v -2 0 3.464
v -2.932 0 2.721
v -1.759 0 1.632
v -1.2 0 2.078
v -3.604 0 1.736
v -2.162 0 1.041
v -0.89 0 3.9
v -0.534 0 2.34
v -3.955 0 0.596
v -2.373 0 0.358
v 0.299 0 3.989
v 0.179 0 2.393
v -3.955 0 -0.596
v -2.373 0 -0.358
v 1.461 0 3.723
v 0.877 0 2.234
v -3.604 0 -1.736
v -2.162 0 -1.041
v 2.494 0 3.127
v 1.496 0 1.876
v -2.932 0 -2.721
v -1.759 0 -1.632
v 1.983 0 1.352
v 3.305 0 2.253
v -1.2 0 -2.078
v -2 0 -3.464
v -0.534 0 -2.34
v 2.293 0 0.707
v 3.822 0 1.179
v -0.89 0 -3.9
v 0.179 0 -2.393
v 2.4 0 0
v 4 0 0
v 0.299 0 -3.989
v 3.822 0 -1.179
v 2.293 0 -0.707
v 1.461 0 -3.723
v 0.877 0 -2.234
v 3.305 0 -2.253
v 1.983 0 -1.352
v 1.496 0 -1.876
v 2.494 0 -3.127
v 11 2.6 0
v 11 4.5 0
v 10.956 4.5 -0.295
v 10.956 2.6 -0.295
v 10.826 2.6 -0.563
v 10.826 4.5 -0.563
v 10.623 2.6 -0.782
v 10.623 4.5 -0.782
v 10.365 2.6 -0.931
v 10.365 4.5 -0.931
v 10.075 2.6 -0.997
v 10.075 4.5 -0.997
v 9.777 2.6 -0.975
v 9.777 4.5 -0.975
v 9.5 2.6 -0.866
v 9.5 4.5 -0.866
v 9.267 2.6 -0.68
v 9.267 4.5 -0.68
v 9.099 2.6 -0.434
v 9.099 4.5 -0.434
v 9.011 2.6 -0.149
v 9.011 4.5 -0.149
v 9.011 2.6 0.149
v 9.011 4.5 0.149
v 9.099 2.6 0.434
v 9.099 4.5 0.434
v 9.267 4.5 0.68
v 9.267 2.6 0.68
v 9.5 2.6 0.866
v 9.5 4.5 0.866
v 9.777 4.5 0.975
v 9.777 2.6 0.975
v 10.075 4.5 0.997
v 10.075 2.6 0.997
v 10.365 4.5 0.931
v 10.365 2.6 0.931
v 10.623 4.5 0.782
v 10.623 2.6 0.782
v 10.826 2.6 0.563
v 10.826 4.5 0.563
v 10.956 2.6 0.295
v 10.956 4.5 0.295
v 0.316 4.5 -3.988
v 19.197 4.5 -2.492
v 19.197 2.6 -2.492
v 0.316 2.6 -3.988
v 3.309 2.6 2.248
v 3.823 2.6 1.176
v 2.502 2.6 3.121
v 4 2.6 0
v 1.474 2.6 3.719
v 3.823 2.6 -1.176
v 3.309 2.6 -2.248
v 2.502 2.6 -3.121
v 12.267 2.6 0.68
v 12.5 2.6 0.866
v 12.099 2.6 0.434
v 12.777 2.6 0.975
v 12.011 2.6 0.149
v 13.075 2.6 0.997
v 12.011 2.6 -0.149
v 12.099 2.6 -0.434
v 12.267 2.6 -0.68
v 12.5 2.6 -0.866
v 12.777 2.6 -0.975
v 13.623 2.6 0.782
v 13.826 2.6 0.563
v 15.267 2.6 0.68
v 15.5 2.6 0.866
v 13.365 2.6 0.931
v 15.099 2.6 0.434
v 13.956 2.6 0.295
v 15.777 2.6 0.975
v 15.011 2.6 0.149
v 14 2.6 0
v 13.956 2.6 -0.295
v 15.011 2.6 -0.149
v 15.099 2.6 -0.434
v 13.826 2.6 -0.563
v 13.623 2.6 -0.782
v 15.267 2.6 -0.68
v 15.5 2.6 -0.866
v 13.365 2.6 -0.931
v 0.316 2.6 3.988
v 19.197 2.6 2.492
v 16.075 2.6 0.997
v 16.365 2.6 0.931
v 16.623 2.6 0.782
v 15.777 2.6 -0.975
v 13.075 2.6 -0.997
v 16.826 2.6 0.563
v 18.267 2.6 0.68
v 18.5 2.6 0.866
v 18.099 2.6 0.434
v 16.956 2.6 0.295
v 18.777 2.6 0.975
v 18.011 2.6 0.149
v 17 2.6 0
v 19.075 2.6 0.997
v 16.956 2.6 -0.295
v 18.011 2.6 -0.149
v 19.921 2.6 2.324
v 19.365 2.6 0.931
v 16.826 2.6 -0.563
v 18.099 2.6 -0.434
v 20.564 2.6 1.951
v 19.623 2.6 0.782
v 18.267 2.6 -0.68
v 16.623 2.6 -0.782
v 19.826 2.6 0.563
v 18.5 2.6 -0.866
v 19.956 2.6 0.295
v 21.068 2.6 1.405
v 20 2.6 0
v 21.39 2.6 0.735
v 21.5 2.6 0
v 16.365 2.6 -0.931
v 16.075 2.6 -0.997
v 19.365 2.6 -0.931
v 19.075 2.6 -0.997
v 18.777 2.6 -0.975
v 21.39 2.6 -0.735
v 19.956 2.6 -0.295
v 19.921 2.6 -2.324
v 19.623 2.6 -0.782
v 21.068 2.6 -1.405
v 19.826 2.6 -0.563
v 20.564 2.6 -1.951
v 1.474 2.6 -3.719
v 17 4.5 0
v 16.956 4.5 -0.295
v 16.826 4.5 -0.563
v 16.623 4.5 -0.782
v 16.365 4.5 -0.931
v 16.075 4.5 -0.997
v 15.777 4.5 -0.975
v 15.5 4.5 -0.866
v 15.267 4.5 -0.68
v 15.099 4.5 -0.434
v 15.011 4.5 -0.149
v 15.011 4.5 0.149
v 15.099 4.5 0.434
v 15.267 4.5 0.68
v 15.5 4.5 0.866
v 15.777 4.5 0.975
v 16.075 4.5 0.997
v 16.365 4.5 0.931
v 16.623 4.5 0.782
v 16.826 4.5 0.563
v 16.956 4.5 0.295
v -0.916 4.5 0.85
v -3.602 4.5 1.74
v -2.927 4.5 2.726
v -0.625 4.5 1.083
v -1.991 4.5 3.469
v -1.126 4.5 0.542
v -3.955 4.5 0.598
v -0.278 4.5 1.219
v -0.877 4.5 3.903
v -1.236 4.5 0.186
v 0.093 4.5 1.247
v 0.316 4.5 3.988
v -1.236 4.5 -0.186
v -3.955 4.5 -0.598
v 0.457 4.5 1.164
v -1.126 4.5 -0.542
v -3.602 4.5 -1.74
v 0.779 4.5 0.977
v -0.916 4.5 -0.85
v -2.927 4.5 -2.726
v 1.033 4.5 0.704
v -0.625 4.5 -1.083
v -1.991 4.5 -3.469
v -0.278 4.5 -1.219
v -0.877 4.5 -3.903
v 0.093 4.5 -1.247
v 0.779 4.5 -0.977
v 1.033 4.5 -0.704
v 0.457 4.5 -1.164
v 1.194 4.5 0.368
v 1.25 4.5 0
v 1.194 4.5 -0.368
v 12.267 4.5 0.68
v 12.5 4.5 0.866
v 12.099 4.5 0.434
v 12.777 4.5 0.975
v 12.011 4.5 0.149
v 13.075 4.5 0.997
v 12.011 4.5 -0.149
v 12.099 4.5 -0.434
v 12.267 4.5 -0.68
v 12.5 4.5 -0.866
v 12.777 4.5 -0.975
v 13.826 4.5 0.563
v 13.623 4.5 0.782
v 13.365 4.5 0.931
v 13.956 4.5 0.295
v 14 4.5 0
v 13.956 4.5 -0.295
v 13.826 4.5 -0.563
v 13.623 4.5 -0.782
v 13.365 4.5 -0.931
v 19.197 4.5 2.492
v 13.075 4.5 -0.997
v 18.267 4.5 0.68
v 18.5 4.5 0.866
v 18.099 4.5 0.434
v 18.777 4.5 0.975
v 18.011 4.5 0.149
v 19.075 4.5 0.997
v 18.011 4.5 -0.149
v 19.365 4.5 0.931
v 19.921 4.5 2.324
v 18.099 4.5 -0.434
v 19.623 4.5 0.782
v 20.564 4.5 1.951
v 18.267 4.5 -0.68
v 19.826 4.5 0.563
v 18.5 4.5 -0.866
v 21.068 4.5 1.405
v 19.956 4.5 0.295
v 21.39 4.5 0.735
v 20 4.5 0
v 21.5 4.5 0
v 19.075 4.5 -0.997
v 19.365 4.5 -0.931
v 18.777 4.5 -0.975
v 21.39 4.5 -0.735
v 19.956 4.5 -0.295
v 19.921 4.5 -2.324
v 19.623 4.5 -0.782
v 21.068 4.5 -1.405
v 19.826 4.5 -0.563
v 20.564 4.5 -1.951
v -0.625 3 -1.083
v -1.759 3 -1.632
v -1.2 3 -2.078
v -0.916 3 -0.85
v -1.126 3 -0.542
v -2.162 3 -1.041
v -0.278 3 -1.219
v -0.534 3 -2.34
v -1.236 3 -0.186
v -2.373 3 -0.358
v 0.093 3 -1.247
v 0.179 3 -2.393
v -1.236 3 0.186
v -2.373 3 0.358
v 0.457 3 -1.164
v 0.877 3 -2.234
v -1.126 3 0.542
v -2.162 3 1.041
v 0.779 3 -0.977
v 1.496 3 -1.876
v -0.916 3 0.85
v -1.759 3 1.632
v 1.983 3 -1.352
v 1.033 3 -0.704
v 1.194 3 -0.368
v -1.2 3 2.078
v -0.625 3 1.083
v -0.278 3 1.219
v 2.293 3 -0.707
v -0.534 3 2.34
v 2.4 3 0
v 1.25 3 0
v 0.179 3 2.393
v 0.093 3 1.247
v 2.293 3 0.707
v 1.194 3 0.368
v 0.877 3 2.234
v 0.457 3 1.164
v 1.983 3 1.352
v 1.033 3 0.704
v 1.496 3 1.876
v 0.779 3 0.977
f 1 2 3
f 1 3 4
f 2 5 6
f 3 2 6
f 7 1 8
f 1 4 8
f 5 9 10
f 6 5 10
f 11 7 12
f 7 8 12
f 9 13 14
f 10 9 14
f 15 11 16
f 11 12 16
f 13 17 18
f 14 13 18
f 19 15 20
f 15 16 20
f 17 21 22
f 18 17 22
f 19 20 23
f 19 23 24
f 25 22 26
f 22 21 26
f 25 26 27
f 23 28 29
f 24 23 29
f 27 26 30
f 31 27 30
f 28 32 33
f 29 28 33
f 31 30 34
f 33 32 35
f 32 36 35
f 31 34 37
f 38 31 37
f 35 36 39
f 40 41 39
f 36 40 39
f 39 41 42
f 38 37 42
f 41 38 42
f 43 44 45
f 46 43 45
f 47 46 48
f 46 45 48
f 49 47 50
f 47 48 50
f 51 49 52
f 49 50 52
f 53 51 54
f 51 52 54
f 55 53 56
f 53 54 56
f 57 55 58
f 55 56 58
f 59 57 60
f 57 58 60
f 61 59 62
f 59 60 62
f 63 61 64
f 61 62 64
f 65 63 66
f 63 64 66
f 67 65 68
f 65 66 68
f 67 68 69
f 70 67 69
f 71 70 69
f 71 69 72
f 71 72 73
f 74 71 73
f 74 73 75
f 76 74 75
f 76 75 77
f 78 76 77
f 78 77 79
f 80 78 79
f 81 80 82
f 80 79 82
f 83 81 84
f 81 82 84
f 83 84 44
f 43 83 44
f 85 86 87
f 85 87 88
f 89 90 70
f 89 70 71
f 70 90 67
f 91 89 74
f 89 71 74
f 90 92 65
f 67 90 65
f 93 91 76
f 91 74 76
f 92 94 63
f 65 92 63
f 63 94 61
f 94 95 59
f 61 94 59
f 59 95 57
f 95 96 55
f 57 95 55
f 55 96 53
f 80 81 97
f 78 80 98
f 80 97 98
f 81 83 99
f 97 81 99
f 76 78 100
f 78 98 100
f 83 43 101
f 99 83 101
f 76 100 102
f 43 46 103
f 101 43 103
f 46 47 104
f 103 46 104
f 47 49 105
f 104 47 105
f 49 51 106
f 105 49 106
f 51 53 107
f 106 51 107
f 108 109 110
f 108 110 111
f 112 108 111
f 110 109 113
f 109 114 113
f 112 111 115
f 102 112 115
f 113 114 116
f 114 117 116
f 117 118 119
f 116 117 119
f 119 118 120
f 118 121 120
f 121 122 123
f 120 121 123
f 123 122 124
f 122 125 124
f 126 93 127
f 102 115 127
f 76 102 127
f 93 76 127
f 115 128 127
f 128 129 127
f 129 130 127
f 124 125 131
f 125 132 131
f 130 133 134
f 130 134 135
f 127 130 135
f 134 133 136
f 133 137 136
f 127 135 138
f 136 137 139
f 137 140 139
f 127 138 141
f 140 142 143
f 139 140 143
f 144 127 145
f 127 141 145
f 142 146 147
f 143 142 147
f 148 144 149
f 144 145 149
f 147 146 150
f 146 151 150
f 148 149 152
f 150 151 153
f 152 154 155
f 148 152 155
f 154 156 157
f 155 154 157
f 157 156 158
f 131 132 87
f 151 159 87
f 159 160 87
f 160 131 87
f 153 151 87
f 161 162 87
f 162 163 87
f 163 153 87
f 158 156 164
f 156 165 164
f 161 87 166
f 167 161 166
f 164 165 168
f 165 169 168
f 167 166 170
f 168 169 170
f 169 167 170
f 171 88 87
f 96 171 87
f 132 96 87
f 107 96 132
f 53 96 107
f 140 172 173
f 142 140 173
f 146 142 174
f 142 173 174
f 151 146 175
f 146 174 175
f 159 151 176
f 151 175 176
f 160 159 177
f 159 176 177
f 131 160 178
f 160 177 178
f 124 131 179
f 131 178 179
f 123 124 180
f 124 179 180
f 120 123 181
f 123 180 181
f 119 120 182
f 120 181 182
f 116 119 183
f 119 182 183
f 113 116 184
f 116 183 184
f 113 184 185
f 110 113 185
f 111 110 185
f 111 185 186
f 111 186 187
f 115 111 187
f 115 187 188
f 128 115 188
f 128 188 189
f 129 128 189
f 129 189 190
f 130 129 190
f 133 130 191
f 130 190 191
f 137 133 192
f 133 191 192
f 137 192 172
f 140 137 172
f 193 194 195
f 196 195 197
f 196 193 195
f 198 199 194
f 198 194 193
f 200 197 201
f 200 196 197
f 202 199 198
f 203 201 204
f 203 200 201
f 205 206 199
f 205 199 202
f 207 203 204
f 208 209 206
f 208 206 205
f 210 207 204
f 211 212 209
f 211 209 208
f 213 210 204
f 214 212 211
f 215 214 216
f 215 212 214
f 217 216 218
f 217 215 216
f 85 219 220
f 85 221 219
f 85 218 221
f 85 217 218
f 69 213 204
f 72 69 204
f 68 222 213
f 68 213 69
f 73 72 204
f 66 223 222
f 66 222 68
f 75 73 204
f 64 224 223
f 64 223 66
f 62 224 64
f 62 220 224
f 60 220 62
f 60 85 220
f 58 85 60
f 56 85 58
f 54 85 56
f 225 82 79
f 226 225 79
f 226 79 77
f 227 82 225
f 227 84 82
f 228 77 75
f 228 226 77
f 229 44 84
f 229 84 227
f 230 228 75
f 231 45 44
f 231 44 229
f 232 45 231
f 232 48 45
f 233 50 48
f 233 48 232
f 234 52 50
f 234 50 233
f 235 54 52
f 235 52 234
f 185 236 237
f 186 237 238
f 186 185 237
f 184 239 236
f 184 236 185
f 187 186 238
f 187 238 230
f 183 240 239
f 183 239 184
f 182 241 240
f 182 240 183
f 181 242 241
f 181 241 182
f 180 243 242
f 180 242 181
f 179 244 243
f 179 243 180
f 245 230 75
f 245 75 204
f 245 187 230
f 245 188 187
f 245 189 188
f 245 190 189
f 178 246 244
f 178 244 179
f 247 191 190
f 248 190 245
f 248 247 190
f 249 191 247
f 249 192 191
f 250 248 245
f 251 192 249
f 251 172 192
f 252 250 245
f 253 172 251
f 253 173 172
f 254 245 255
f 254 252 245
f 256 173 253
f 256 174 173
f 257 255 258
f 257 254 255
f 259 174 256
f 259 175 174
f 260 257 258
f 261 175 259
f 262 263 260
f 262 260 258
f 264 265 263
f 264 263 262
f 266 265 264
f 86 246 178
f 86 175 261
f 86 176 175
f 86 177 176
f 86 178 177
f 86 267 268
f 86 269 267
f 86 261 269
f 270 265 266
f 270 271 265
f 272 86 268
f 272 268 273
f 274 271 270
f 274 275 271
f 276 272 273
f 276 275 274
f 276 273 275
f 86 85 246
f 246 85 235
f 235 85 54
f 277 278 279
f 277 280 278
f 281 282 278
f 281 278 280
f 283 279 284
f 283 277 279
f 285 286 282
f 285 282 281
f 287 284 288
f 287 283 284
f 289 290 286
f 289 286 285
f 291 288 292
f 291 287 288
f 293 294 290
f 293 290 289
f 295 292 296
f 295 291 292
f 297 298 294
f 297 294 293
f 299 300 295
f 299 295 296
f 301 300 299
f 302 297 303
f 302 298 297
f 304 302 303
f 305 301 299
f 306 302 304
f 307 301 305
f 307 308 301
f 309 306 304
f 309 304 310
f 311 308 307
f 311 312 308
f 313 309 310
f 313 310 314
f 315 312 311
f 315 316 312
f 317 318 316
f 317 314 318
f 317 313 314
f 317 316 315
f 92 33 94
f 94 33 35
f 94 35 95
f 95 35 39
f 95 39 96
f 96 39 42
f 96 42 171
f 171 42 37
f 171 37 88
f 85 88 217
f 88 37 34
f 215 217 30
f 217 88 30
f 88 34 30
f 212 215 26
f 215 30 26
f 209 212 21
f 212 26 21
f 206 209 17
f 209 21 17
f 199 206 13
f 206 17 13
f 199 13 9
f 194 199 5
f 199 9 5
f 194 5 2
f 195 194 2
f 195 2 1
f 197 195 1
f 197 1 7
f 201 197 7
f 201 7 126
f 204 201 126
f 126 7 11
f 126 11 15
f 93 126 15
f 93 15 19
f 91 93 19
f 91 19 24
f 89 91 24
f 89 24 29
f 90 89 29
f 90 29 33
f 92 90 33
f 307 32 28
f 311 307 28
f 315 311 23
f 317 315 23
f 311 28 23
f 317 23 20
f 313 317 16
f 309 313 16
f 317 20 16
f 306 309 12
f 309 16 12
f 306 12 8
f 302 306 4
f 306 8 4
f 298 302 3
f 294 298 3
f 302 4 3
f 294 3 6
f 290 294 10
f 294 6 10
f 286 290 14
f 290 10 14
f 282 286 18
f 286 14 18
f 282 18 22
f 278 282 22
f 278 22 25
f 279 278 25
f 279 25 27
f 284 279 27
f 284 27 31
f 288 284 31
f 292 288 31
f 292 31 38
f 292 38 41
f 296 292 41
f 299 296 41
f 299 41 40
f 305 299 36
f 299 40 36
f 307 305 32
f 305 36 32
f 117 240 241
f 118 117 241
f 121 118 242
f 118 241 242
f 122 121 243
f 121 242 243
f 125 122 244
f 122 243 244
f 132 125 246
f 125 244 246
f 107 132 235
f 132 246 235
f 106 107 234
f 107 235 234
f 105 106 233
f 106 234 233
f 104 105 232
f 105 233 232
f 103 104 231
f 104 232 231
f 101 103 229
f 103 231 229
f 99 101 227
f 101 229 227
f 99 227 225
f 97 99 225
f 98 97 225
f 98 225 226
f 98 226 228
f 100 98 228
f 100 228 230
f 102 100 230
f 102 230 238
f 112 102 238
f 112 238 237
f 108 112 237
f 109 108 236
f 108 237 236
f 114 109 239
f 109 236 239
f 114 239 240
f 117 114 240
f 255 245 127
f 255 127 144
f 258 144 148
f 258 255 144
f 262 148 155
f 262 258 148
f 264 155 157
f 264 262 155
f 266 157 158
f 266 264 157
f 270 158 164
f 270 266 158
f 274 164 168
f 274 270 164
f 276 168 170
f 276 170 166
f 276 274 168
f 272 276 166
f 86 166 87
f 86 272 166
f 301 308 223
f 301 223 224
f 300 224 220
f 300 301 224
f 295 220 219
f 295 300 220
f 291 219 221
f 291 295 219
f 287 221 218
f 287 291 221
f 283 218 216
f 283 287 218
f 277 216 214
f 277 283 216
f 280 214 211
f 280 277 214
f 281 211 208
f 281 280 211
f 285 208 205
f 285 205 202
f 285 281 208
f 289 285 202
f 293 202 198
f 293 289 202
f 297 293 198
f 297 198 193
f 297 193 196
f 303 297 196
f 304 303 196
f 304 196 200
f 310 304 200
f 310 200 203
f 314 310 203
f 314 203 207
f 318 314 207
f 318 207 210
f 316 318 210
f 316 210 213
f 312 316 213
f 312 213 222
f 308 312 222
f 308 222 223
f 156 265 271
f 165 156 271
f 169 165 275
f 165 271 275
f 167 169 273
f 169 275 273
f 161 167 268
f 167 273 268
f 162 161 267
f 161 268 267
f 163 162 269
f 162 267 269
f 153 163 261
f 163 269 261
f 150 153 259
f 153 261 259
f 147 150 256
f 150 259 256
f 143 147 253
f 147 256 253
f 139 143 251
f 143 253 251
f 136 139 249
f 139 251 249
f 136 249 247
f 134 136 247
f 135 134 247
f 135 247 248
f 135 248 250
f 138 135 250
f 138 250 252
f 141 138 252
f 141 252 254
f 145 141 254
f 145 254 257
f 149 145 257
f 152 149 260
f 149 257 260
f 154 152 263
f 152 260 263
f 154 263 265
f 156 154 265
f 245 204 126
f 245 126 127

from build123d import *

# Parameters (mm, degrees)
SKETCH_1_R          = 4
SKETCH_1_R_2        = 1.25
EXTRUDE_1_DEPTH     = 4.5
SKETCH_2_R          = 1
EXTRUDE_2_DEPTH     = 1.9
SKETCH_3_R          = 2.4
CUT_EXTRUDE_1_DEPTH = 3


with BuildPart() as part:
    # 草图1 → 凸台-拉伸1 (new body)
    with BuildSketch(Plane(origin=(0, 0, 0), x_dir=(1, 0, 0), z_dir=(0, 1, 0))):
        Circle(SKETCH_1_R)
        Circle(SKETCH_1_R_2, mode=Mode.SUBTRACT)
    extrude(amount=EXTRUDE_1_DEPTH)

    # 草图2 → 凸台-拉伸2 (add)
    with BuildSketch(Plane(origin=(0, 4.5, 0), x_dir=(1, 0, 0), z_dir=(0, 1, 0))):
        with BuildLine():
            Line((19.197368421, 2.492196964), (0.315789474, 3.987515142))
            ThreePointArc((0.315789474, 3.987515142), (4, 0), (0.315789474, -3.987515142))
            Line((0.315789474, -3.987515142), (19.197368421, -2.492196964))
            ThreePointArc((19.197368421, -2.492196964), (21.5, 0), (19.197368421, 2.492196964))
        make_face()
        with Locations((16, 0)):
            Circle(SKETCH_2_R, mode=Mode.SUBTRACT)
        with Locations((10, 0)):
            Circle(SKETCH_2_R, mode=Mode.SUBTRACT)
        with Locations((13, 0)):
            Circle(SKETCH_2_R, mode=Mode.SUBTRACT)
        with Locations((19, 0)):
            Circle(SKETCH_2_R, mode=Mode.SUBTRACT)
    extrude(amount=-EXTRUDE_2_DEPTH)

    # 草图3 → 切除-拉伸1 (cut)
    with BuildSketch(Plane.XZ):
        Circle(SKETCH_3_R)
    extrude(amount=-CUT_EXTRUDE_1_DEPTH, mode=Mode.SUBTRACT)


solid = part.part
